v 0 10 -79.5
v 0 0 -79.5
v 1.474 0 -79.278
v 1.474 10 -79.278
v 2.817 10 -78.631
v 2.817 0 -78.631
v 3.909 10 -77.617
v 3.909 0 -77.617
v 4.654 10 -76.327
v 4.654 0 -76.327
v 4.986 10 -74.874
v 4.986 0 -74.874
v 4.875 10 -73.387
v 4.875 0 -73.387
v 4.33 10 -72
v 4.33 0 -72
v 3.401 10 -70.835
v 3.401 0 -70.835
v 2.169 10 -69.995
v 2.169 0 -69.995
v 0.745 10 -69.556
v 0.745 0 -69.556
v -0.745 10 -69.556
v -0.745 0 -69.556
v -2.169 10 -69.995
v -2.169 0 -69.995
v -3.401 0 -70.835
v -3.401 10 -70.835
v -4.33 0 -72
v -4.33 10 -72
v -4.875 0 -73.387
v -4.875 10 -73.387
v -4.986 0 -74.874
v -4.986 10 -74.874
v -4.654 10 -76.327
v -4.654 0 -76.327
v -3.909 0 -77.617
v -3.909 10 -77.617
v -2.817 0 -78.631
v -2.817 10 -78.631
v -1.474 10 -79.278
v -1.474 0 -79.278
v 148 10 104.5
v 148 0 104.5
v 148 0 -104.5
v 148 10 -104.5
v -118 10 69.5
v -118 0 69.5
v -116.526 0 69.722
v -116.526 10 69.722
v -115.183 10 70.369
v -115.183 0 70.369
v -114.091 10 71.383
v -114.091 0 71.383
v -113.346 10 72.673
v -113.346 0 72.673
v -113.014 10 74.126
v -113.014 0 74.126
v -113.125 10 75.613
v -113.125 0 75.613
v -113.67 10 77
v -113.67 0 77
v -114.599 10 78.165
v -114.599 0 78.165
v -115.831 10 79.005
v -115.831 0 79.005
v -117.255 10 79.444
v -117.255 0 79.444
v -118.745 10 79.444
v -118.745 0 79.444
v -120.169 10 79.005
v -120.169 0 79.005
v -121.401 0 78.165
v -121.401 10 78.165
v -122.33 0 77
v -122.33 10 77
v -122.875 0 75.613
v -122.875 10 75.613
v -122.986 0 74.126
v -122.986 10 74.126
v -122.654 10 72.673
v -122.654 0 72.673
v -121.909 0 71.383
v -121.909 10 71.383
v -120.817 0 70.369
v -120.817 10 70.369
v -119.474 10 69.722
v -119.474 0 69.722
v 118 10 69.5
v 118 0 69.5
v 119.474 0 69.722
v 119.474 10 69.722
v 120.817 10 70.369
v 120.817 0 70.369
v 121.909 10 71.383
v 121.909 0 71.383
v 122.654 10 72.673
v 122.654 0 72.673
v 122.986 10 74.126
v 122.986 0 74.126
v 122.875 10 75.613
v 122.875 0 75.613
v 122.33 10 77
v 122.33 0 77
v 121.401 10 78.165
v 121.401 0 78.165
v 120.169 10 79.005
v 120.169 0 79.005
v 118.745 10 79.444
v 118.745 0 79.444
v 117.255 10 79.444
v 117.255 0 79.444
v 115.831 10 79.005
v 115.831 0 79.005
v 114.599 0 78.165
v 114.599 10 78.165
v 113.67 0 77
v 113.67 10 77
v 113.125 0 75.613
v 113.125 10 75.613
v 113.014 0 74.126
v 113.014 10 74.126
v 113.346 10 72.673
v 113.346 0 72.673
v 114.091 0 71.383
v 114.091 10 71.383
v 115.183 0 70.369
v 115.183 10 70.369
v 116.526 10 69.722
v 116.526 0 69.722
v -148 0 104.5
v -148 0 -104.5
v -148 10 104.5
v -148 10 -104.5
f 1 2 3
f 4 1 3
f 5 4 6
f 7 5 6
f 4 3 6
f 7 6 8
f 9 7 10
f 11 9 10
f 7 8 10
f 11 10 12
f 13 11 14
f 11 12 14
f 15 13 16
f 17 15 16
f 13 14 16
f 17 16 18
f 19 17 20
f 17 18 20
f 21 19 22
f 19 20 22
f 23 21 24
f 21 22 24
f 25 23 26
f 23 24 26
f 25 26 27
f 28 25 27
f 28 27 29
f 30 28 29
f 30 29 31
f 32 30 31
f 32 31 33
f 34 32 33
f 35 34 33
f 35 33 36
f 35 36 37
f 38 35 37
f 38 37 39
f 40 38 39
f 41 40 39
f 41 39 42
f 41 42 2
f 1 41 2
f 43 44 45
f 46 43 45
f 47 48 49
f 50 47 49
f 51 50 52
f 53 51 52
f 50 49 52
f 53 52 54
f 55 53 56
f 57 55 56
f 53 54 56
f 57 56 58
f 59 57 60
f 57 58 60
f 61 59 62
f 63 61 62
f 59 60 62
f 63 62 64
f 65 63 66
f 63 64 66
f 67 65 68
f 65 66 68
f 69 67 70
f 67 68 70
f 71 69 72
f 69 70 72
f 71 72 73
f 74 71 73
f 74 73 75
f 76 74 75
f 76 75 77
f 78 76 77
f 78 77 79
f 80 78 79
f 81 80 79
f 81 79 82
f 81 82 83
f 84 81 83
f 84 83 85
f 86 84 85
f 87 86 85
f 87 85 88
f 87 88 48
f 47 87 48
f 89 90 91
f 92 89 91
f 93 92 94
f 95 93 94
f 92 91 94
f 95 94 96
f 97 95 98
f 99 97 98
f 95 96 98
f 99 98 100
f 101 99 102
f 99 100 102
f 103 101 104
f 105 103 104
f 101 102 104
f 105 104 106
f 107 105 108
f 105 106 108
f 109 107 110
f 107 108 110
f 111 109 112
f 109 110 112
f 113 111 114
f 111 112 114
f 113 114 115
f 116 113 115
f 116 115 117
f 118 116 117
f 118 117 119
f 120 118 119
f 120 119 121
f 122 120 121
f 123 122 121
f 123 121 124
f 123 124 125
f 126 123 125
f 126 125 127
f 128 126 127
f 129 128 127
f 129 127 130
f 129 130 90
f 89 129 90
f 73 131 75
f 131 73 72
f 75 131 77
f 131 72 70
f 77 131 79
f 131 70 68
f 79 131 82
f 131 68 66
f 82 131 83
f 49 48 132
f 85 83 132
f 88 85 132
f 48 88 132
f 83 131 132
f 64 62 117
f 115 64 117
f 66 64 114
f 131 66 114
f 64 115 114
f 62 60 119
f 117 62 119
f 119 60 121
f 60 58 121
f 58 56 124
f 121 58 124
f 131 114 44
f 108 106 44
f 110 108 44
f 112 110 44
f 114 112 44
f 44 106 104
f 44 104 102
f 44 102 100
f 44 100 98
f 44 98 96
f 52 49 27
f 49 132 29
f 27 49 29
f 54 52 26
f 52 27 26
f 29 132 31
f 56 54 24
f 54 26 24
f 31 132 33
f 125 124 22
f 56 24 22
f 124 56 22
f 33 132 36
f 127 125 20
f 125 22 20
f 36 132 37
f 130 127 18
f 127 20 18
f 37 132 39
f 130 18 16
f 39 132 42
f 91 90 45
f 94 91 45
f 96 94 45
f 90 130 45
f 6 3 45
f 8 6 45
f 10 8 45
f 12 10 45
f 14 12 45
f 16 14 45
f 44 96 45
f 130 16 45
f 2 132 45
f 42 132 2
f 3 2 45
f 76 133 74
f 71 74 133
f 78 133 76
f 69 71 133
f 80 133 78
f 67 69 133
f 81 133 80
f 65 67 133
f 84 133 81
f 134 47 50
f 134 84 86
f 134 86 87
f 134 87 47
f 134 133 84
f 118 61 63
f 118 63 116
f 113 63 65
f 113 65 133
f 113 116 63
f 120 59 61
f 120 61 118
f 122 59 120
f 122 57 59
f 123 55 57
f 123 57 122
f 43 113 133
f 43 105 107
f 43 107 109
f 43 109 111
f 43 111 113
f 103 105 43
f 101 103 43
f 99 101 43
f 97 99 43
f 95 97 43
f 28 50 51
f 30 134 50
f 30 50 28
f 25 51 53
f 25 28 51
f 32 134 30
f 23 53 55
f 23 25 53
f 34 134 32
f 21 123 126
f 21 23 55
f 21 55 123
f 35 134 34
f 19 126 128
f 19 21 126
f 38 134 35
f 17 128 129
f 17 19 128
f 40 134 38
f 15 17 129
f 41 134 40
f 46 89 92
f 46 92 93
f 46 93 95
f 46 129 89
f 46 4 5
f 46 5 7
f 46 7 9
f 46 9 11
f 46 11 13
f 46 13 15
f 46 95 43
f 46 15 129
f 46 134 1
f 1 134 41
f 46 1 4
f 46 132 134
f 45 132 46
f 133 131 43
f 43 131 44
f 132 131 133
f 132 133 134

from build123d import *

# Parameters (mm, degrees)
SKETCH1_W          = 296
SKETCH1_H          = 209
EXTRUDE1_DEPTH     = 10
CUT_EXTRUDE1_REACH = 183.45
SKETCH2_R          = 5


with BuildPart() as part:
    # Sketch1 → Extrude1 (new body)
    with BuildSketch(Plane(origin=(0, 0, 0), x_dir=(1, 0, 0), z_dir=(0, 1, 0))):
        Rectangle(SKETCH1_W, SKETCH1_H)
    extrude(amount=EXTRUDE1_DEPTH)

    # Sketch2 → Cut-Extrude1 (cut, up to next)
    with BuildSketch(Plane.XZ, mode=Mode.PRIVATE) as cut_extrude1_sk1:
        with Locations(Location((-118, 74.5, 0), (0, 0, 270))):
            Circle(SKETCH2_R)
    cut_extrude1_tool1 = extrude(cut_extrude1_sk1.sketch, amount=-CUT_EXTRUDE1_REACH, mode=Mode.PRIVATE) & part.part
    # Sketch2 → Cut-Extrude1 (cut, up to next)
    with BuildSketch(Plane.XZ, mode=Mode.PRIVATE) as cut_extrude1_sk2:
        with Locations(Location((118, 74.5, 0), (0, 0, 270))):
            Circle(SKETCH2_R)
    cut_extrude1_tool2 = extrude(cut_extrude1_sk2.sketch, amount=-CUT_EXTRUDE1_REACH, mode=Mode.PRIVATE) & part.part
    # Sketch2 → Cut-Extrude1 (cut, up to next)
    with BuildSketch(Plane.XZ, mode=Mode.PRIVATE) as cut_extrude1_sk3:
        with Locations(Location((0, -74.5, 0), (0, 0, 270))):
            Circle(SKETCH2_R)
    cut_extrude1_tool3 = extrude(cut_extrude1_sk3.sketch, amount=-CUT_EXTRUDE1_REACH, mode=Mode.PRIVATE) & part.part
    add(cut_extrude1_tool1.solids().sort_by_distance((-118, 0, 74.5))[0], mode=Mode.SUBTRACT)
    add(cut_extrude1_tool2.solids().sort_by_distance((118, 0, 74.5))[0], mode=Mode.SUBTRACT)
    add(cut_extrude1_tool3.solids().sort_by_distance((0, 0, -74.5))[0], mode=Mode.SUBTRACT)


solid = part.part
